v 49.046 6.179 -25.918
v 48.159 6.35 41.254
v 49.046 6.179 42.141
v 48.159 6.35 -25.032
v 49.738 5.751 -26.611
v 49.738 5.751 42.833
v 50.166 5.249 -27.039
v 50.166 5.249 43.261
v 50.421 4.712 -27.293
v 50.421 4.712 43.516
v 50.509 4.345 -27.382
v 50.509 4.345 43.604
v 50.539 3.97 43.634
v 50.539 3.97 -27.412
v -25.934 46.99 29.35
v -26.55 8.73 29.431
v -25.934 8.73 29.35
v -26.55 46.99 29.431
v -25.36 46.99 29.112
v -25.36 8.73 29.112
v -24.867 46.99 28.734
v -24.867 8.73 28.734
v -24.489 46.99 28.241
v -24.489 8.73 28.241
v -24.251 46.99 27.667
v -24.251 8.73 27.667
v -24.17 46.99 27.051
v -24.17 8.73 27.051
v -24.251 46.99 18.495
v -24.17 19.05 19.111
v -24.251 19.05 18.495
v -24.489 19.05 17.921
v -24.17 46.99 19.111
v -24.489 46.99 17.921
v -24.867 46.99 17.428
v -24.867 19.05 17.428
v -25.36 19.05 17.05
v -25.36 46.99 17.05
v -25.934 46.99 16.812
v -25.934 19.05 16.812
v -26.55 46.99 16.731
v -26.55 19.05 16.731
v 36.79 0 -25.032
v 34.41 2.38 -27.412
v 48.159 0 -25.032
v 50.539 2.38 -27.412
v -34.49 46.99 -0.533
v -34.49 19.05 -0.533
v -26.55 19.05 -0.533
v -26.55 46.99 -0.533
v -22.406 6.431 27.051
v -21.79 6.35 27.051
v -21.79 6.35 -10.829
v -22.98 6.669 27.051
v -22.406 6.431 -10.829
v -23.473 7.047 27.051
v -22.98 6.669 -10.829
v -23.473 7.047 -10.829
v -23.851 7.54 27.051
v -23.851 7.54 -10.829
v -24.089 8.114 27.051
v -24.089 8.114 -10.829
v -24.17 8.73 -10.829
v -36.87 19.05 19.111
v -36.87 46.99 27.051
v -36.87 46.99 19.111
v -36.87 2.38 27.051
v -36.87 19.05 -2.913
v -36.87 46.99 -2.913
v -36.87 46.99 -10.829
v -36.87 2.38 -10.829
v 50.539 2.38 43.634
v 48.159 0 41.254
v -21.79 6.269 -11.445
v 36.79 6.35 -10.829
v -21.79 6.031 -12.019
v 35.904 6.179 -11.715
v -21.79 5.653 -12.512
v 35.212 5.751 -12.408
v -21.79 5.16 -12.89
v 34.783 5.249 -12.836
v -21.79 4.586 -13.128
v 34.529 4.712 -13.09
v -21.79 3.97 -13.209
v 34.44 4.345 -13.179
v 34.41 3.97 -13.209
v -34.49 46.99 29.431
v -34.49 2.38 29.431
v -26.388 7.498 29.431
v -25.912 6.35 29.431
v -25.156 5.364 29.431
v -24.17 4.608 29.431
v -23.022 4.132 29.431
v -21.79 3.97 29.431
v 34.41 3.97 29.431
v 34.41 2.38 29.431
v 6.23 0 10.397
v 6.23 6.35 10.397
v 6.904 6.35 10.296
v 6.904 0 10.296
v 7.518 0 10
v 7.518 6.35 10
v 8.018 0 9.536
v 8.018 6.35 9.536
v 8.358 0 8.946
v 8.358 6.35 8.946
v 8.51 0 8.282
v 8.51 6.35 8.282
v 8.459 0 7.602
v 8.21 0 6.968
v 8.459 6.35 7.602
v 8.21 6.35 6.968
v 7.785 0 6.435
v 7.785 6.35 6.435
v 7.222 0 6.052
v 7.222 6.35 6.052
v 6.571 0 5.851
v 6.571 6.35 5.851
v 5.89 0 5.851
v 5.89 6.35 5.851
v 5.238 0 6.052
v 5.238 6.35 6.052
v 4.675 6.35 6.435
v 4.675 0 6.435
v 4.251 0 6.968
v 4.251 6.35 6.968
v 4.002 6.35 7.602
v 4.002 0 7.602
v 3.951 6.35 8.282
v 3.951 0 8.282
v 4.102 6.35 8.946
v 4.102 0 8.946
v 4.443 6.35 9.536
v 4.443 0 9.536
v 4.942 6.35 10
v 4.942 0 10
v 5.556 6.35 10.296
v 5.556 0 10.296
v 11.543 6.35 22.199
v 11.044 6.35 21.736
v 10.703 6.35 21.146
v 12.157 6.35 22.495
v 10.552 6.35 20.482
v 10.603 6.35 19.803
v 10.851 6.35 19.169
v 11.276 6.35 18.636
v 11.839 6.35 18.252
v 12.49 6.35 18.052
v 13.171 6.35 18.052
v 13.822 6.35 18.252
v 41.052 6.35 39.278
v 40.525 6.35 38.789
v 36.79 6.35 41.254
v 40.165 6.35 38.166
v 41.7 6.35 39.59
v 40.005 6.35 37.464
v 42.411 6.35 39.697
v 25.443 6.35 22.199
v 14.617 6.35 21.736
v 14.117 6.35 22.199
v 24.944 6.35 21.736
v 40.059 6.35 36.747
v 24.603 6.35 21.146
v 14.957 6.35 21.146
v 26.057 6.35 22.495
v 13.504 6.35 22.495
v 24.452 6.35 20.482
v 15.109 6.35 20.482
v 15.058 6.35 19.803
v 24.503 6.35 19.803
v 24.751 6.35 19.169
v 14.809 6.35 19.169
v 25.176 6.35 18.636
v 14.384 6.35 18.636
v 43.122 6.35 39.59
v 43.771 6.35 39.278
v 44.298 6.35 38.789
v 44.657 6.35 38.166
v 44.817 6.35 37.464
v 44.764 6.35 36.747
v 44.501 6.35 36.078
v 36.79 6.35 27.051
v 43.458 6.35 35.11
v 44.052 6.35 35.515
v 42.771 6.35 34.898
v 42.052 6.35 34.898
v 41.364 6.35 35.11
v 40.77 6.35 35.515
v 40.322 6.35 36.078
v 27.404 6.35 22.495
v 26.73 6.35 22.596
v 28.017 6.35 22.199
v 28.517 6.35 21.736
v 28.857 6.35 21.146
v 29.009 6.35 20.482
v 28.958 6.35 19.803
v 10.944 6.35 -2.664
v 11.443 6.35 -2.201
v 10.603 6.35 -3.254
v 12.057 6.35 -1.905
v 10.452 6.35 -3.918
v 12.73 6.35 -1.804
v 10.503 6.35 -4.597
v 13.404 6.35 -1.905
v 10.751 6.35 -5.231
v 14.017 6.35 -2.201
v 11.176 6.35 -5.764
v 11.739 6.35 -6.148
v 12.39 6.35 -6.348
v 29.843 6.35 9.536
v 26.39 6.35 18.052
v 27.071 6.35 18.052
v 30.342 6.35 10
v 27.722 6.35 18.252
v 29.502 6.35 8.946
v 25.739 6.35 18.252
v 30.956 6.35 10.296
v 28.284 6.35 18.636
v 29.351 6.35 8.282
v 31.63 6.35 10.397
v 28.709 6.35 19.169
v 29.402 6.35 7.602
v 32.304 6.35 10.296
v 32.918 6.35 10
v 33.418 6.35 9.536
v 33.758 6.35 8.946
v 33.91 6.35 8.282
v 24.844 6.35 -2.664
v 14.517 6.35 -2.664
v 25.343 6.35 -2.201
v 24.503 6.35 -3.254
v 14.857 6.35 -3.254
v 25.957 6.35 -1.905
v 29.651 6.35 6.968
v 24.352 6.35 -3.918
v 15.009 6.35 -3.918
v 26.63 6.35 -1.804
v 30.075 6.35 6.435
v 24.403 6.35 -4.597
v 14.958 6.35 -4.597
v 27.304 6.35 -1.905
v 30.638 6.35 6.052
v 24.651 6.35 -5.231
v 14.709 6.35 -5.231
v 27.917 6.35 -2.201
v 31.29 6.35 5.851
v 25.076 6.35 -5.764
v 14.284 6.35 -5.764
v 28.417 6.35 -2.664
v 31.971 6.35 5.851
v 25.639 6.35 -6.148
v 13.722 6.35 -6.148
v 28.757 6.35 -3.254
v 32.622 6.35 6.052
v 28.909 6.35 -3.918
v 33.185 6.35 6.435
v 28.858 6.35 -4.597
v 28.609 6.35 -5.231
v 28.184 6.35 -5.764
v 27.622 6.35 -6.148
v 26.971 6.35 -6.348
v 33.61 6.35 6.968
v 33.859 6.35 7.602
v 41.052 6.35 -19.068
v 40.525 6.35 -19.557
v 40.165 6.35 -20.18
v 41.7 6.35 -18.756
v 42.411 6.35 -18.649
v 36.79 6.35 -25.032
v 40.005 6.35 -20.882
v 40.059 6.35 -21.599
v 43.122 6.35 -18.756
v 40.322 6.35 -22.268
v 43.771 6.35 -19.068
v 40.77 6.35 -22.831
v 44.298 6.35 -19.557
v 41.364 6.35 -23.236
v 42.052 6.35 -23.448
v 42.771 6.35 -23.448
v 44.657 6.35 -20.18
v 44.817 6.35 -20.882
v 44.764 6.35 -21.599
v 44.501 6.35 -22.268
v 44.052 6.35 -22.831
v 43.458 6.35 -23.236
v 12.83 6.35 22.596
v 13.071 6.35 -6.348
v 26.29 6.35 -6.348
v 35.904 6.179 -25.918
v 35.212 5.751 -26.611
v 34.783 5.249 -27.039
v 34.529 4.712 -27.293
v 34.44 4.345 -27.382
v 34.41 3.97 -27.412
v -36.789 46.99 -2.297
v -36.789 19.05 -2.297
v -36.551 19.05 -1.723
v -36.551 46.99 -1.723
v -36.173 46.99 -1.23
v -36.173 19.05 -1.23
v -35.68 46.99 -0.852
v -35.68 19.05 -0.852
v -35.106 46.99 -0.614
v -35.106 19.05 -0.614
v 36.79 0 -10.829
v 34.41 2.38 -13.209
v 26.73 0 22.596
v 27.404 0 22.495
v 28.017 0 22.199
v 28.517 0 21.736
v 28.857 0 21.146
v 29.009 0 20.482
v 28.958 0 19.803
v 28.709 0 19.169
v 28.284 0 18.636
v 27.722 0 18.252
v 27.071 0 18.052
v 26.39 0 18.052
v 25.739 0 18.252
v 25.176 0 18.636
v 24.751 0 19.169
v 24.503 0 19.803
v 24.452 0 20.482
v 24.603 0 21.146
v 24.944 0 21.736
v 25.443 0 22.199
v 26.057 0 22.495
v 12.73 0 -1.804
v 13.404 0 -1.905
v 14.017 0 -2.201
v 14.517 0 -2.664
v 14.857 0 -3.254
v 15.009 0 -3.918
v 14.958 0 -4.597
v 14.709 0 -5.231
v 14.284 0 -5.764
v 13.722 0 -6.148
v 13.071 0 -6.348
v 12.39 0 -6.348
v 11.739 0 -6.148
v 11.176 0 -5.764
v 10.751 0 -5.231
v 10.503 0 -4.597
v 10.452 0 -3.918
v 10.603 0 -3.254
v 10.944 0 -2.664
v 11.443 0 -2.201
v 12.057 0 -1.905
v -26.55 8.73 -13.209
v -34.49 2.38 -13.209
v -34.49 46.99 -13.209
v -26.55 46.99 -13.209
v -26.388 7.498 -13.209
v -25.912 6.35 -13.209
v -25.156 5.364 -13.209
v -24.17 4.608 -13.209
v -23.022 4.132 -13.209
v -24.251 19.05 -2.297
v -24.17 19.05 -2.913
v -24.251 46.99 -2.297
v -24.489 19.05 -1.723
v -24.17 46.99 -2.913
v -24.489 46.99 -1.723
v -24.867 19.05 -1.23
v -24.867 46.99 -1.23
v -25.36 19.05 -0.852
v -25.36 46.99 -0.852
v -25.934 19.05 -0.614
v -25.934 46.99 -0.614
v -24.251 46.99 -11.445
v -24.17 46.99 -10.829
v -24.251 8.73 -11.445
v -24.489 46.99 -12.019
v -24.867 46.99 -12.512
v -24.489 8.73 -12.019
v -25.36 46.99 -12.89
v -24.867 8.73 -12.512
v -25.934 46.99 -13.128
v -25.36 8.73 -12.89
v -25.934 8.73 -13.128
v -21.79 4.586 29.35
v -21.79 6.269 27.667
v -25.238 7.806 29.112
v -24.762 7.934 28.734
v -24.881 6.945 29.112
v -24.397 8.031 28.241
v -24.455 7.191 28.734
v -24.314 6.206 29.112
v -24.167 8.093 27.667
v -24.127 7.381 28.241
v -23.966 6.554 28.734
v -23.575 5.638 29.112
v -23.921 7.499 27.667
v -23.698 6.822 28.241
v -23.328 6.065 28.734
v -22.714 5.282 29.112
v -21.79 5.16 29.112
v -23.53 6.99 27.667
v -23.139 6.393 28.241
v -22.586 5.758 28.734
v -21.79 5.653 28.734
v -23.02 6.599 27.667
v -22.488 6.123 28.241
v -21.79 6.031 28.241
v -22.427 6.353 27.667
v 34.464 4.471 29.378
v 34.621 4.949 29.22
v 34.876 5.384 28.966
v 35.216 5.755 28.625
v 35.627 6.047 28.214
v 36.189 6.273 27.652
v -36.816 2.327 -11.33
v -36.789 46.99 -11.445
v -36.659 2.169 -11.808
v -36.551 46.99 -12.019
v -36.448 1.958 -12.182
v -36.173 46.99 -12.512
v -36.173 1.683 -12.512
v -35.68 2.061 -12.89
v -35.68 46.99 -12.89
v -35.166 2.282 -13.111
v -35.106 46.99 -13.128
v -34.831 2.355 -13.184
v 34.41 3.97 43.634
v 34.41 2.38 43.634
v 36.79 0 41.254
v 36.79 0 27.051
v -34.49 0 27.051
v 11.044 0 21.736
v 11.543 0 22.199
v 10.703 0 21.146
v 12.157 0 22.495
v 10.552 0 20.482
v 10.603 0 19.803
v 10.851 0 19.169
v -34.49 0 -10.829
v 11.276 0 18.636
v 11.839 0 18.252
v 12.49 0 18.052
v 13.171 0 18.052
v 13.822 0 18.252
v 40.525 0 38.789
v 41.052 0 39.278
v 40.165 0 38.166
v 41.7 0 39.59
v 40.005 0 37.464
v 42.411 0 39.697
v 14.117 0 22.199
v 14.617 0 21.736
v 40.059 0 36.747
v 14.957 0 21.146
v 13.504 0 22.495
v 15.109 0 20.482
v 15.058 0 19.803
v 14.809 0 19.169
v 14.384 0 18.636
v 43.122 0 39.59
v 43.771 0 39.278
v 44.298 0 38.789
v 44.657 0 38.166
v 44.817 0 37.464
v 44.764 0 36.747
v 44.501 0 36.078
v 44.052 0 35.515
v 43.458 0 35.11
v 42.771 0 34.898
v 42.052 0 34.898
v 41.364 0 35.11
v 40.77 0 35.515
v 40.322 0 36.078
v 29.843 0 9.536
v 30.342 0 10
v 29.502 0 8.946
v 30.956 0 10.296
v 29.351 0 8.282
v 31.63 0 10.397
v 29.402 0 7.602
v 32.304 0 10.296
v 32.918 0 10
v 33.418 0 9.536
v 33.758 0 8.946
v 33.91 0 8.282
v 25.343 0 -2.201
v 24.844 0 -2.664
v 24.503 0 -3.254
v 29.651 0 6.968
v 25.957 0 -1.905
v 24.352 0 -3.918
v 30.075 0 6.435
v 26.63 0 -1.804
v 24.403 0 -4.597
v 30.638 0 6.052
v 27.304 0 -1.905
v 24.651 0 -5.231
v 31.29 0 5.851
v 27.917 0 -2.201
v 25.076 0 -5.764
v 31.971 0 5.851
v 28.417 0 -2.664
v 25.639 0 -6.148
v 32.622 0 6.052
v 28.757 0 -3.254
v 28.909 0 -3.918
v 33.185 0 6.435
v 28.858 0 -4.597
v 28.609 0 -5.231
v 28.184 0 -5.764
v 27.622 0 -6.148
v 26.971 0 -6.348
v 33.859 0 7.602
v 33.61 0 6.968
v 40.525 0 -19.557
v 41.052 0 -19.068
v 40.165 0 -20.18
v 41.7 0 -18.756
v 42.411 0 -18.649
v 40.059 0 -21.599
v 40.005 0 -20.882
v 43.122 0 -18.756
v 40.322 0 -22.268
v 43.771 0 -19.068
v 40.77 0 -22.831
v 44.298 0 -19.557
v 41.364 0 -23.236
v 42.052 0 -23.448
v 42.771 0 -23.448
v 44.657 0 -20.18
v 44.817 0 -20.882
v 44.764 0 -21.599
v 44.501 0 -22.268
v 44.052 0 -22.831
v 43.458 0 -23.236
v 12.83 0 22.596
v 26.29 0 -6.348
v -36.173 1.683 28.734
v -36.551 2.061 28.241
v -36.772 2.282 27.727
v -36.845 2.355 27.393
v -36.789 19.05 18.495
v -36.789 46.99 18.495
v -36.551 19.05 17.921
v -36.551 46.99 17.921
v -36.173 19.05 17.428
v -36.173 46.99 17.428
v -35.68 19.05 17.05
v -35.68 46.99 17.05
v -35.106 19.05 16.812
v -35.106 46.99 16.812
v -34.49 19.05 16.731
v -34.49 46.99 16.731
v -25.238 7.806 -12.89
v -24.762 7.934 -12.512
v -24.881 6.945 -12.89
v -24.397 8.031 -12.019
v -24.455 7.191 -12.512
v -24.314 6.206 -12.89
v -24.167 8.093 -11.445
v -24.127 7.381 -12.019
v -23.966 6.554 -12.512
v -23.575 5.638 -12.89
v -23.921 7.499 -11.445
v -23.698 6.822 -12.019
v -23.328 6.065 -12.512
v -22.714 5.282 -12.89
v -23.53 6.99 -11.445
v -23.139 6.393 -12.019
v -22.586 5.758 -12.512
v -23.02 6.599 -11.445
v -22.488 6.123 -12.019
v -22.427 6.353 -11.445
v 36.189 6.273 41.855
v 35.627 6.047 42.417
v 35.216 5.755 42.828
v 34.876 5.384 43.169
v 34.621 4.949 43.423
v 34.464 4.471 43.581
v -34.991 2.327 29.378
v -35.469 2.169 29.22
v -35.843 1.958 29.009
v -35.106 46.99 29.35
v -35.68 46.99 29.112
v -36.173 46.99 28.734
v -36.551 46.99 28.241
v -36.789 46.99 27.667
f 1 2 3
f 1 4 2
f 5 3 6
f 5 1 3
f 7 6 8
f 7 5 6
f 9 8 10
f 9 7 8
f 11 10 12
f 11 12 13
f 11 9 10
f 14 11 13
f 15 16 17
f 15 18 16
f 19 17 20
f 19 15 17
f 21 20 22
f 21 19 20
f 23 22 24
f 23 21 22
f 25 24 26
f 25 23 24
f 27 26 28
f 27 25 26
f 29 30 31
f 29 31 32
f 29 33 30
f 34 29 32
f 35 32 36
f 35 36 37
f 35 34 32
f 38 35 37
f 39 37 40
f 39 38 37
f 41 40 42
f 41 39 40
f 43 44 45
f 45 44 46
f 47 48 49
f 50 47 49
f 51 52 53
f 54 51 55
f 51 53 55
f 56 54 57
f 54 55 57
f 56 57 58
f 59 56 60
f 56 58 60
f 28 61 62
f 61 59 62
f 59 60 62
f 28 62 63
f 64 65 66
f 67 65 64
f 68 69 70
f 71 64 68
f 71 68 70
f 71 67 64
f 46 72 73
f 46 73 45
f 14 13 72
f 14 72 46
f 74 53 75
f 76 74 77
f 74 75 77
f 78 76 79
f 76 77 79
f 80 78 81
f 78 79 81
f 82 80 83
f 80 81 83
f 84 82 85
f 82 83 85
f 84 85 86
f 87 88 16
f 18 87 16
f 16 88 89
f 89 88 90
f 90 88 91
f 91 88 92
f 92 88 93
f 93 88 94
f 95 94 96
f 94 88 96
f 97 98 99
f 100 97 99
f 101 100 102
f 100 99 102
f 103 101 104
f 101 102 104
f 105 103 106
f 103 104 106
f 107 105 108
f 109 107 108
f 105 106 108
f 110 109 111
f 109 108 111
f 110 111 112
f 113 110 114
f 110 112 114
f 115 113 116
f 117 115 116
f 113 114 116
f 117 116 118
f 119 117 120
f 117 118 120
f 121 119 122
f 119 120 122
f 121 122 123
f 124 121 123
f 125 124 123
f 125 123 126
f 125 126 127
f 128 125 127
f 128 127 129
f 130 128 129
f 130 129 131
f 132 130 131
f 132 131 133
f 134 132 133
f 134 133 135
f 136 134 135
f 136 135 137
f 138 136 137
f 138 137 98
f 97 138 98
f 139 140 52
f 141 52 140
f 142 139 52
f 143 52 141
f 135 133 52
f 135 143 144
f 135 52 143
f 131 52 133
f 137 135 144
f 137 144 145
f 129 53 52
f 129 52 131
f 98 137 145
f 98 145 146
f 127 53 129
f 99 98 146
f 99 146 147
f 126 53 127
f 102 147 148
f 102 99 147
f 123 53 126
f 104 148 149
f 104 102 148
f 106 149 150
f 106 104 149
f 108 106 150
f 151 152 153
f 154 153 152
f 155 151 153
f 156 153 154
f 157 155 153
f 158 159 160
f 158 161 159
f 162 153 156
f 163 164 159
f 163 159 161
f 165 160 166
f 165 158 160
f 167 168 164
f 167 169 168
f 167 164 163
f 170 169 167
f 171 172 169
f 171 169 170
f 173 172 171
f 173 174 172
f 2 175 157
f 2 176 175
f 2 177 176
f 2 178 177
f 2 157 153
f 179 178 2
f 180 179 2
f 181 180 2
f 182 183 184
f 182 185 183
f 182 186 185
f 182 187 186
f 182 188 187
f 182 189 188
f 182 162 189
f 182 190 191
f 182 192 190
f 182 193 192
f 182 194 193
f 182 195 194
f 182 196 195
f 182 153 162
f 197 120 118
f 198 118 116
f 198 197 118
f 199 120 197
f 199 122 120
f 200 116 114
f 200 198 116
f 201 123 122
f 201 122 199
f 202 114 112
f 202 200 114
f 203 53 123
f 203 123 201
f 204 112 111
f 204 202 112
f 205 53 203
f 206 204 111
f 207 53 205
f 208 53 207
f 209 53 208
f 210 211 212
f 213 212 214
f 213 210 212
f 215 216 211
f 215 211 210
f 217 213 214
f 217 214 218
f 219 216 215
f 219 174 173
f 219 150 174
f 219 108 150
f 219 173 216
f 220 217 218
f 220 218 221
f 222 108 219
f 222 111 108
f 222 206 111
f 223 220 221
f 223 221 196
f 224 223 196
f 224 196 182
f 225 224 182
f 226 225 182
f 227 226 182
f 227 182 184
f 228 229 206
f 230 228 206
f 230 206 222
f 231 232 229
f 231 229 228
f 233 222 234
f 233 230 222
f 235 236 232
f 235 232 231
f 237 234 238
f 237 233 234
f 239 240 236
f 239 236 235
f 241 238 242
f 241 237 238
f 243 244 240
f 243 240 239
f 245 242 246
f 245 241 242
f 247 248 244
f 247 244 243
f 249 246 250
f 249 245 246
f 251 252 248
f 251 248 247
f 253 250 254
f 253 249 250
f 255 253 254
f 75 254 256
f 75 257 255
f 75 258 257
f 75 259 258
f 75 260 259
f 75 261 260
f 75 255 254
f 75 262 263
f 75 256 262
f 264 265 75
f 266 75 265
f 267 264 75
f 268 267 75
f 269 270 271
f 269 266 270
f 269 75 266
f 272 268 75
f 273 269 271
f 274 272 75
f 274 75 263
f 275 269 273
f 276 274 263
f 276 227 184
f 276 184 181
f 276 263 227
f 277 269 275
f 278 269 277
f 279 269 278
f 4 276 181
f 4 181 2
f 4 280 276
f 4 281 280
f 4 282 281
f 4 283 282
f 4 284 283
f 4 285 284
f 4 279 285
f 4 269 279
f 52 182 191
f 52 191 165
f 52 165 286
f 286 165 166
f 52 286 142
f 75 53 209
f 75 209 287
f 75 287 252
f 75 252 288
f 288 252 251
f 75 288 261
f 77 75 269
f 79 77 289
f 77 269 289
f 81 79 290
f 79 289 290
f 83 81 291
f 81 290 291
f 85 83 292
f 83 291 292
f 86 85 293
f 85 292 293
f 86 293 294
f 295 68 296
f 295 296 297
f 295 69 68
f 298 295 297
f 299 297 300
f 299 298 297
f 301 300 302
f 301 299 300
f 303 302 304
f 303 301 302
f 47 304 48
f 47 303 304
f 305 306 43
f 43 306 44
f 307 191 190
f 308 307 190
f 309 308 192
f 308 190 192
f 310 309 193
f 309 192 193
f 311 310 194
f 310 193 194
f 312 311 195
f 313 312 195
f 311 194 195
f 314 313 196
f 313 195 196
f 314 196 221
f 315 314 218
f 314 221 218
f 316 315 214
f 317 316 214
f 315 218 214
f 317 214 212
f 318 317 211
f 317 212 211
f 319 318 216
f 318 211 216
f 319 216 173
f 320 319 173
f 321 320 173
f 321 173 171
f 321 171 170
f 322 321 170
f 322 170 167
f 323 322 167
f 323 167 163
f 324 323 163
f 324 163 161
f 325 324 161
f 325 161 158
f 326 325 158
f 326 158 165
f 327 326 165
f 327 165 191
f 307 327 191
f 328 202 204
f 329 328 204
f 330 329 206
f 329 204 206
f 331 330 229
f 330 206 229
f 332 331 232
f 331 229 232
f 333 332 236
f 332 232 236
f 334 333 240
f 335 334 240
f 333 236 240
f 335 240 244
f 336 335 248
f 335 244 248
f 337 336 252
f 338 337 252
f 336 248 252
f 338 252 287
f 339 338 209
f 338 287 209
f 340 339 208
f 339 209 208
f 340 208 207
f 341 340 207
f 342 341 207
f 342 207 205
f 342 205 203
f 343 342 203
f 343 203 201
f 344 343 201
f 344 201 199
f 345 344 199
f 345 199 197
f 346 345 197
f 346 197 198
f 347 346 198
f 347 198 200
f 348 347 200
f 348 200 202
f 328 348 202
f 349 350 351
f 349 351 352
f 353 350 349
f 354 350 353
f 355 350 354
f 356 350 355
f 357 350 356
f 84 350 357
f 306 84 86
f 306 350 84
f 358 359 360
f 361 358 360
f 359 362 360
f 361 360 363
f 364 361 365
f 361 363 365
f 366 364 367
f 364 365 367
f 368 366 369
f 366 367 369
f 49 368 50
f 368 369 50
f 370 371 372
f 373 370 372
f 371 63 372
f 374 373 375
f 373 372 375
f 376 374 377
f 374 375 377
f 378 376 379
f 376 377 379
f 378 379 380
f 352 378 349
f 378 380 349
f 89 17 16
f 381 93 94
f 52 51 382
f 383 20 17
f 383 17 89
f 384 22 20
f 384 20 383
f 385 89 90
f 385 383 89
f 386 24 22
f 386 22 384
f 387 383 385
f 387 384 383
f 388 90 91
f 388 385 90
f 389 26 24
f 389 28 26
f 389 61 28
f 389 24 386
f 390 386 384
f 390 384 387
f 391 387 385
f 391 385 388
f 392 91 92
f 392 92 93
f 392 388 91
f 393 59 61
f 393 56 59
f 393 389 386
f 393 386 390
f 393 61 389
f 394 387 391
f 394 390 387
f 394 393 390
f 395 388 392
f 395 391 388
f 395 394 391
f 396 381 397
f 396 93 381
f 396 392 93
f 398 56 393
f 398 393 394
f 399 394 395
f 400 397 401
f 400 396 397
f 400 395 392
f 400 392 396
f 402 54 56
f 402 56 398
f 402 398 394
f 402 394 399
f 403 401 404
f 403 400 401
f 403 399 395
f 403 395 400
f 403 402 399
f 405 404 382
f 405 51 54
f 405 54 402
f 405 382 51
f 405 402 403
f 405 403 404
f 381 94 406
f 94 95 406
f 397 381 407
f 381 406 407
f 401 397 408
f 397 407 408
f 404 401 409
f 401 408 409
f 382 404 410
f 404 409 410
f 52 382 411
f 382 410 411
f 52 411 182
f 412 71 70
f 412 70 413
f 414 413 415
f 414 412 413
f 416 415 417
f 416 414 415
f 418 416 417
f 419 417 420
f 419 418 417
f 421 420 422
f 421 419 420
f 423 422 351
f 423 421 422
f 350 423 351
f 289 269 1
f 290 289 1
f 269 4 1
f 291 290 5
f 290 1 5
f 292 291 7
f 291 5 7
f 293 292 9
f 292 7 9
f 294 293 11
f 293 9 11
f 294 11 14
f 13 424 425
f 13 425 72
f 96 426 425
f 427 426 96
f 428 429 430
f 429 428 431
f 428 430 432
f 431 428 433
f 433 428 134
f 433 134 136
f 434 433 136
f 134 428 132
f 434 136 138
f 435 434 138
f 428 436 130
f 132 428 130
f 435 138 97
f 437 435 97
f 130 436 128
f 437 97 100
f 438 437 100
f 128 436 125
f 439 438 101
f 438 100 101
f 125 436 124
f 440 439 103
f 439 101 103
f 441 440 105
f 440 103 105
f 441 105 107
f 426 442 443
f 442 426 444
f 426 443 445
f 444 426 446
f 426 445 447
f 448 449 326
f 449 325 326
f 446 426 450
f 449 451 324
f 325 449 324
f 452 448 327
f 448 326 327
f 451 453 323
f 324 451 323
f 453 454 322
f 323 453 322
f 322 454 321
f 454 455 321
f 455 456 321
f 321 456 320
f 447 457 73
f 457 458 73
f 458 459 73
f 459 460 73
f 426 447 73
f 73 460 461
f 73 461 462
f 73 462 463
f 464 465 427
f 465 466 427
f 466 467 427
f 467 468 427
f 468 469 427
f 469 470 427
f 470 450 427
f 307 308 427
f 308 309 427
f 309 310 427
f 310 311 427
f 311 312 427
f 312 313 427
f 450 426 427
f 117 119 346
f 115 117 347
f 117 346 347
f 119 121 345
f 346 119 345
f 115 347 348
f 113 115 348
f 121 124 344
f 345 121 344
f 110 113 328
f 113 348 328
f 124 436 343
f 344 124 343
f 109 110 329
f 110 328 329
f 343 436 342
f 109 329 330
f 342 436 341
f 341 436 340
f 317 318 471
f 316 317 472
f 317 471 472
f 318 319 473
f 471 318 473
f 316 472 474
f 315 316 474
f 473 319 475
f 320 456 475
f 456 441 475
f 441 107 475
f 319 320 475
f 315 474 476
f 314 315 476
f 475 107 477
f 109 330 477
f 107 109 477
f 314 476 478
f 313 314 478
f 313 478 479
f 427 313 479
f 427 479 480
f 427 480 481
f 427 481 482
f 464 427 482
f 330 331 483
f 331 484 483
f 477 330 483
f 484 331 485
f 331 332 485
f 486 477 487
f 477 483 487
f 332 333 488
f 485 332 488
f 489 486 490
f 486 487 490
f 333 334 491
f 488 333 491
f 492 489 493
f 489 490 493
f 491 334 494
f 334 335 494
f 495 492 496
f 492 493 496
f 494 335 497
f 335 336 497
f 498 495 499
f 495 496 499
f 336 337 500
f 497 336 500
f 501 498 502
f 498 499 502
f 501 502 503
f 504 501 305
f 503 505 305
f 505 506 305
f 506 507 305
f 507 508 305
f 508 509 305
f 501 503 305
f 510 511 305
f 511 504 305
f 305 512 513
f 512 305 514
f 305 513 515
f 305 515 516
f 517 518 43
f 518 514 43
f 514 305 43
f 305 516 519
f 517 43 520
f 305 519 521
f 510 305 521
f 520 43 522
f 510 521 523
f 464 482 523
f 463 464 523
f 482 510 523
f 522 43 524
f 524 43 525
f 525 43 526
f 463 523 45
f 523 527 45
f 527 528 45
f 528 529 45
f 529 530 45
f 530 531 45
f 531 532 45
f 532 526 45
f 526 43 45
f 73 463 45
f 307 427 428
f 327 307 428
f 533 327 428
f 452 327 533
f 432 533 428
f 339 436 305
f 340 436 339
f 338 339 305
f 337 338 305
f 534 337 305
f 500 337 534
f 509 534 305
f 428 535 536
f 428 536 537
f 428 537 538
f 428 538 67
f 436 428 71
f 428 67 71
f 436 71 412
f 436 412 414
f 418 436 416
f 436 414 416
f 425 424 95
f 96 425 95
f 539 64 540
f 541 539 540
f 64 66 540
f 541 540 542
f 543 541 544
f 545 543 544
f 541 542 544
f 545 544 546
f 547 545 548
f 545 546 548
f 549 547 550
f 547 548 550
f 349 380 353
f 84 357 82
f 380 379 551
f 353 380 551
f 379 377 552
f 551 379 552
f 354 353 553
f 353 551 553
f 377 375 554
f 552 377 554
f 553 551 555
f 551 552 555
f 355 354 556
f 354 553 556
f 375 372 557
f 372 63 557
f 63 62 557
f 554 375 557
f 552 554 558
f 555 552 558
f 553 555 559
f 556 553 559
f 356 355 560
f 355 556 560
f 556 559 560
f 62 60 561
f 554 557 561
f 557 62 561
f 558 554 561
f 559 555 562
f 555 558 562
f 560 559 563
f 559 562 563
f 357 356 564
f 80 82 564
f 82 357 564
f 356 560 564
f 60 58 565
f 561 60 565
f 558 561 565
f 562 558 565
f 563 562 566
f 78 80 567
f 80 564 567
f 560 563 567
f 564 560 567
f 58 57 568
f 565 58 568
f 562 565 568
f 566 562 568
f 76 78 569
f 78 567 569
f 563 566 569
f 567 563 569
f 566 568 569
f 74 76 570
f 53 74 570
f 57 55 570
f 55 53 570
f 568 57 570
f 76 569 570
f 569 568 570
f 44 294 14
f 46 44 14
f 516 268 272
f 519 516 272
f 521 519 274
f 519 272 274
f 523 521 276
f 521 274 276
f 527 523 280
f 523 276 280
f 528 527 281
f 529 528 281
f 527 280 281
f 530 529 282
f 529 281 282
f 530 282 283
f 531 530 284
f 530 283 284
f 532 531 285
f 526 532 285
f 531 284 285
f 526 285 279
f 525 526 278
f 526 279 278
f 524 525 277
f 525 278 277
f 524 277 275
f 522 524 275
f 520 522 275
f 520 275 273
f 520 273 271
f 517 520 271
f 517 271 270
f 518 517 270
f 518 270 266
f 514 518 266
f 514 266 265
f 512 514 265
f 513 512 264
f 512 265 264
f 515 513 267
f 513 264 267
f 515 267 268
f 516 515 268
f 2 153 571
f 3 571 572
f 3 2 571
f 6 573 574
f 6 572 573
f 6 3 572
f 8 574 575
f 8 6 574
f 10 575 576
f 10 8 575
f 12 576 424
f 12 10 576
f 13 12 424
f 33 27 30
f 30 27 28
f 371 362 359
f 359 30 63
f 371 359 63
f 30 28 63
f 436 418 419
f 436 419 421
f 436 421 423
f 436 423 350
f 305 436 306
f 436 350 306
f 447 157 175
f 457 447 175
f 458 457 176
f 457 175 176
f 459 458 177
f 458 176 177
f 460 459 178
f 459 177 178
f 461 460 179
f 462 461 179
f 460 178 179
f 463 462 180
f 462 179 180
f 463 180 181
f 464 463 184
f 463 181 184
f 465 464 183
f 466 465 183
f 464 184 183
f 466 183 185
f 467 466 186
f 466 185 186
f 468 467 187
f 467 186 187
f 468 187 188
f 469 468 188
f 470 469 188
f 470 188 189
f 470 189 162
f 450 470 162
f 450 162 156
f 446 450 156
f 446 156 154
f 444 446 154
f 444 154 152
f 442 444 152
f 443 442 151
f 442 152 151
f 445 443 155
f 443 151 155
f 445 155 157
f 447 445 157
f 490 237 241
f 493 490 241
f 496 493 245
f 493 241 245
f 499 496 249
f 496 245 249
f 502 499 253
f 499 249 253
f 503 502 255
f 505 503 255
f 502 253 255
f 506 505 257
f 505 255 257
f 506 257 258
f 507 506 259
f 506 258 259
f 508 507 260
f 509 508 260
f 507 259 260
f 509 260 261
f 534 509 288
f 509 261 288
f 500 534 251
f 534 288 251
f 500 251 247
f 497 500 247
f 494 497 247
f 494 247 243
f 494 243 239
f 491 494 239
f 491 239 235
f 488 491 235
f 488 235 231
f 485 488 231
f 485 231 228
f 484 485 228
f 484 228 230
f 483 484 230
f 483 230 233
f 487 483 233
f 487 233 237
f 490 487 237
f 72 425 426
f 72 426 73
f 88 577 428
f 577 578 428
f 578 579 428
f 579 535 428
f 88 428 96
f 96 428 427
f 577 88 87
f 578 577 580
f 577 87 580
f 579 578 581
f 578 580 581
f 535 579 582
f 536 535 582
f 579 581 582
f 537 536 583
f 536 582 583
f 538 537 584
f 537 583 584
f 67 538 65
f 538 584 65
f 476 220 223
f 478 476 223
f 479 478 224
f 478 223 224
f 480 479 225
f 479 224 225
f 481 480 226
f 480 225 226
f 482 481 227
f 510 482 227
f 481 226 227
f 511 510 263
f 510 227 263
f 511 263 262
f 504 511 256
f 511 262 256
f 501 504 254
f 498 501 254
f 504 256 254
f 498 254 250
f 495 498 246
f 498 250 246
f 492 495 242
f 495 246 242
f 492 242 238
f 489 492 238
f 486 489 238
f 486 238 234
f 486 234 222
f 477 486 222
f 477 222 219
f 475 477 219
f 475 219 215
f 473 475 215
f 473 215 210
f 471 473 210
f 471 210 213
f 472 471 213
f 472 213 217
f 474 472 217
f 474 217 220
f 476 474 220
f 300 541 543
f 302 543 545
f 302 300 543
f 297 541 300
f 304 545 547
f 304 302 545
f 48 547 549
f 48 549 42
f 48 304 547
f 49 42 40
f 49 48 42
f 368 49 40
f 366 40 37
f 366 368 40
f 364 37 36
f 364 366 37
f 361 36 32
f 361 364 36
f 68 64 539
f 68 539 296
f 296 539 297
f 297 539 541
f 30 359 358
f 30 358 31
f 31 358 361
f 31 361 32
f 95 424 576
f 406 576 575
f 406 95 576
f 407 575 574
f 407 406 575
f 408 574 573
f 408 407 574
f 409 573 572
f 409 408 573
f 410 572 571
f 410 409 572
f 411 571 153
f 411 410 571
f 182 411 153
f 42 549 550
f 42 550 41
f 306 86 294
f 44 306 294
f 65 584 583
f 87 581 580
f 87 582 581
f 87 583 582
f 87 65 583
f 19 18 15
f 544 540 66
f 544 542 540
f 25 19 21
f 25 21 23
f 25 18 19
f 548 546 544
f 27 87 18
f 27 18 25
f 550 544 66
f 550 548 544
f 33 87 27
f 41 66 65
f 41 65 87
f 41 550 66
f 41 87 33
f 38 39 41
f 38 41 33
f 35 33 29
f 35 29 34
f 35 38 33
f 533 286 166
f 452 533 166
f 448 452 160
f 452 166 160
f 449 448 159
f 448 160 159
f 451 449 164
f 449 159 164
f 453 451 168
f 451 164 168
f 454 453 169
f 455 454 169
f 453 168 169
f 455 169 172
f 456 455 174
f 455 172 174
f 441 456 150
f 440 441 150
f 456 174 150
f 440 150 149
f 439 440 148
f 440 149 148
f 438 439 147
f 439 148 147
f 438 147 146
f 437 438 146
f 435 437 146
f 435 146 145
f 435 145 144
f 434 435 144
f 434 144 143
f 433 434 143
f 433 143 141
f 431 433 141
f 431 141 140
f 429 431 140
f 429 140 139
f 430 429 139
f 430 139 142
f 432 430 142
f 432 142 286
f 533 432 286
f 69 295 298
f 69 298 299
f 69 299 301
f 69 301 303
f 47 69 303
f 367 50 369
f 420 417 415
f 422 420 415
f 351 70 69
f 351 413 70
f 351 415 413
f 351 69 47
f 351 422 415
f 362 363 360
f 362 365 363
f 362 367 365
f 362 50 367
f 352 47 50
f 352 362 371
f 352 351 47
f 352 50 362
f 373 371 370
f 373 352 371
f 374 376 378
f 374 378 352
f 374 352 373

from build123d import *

# Parameters (mm, degrees)
SKETCH1_W           = 71.28
SKETCH1_H           = 42.64
BOSS_EXTRUDE1_DEPTH = 6.35
SKETCH3_W           = 12.7
SKETCH3_H           = 42.64
BOSS_EXTRUDE3_DEPTH = 12.7
SKETCH4_W           = 12.7
SKETCH4_H           = 12.7
BOSS_EXTRUDE4_DEPTH = 27.94
SKETCH6_W           = 12.7
SKETCH6_H           = 12.676175504
BOSS_EXTRUDE5_DEPTH = 27.94
SKETCH7_R           = 2.286
SKETCH7_R_2         = 2.285
CUT_EXTRUDE1_DEPTH  = 63.267019151
SKETCH10_W          = 16.129
SKETCH10_H          = 71.046005576
BOSS_EXTRUDE6_DEPTH = 6.35
SKETCH11_R          = 2.413
CUT_EXTRUDE2_DEPTH  = 6.35
CHAMFER1_SIZE       = 2.38
FILLET1_R           = 2.38


with BuildPart() as part:
    # Sketch1 → Boss-Extrude1 (new body)
    with BuildSketch(Plane(origin=(0, 0, 0), x_dir=(1, 0, 0), z_dir=(0, 1, 0))):
        with Locations((-1.22975773, -8.11115762)):
            Rectangle(SKETCH1_W, SKETCH1_H)
    extrude(amount=BOSS_EXTRUDE1_DEPTH)

    # Sketch3 → Boss-Extrude3 (add)
    with BuildSketch(Plane(origin=(0, 6.35, 0), x_dir=(1, 0, 0), z_dir=(0, 1, 0))):
        with Locations((-30.51975773, -8.11115762)):
            Rectangle(SKETCH3_W, SKETCH3_H)
    extrude(amount=BOSS_EXTRUDE3_DEPTH)

    # Sketch4 → Boss-Extrude4 (add)
    with BuildSketch(Plane(origin=(0, 19.05, 0), x_dir=(1, 0, 0), z_dir=(0, 1, 0))):
        with Locations((-30.51975773, -23.08115762)):
            Rectangle(SKETCH4_W, SKETCH4_H)
    extrude(amount=BOSS_EXTRUDE4_DEPTH)

    # Sketch6 → Boss-Extrude5 (add)
    with BuildSketch(Plane(origin=(0, 19.05, 0), x_dir=(1, 0, 0), z_dir=(0, 1, 0))):
        with Locations((-30.51975773, 6.870754628)):
            Rectangle(SKETCH6_W, SKETCH6_H)
    extrude(amount=BOSS_EXTRUDE5_DEPTH)

    # Sketch7 → Cut-Extrude1 (cut, through all)
    with BuildSketch(Plane(origin=(0, 6.35, 0), x_dir=(1, 0, 0), z_dir=(0, 1, 0))):
        with Locations(Location((6.23024227, -8.11115762, 0), (0, 0, 270))):
            Circle(SKETCH7_R)
        with Locations(Location((31.63024227, -8.11115762, 0), (0, 0, 270))):
            Circle(SKETCH7_R)
        with Locations(Location((12.73024227, 4.08884238, 0), (0, 0, 270))):
            Circle(SKETCH7_R_2)
        with Locations(Location((12.83024227, -20.31115762, 0), (0, 0, 270))):
            Circle(SKETCH7_R_2)
        with Locations(Location((26.63024227, 4.08884238, 0), (0, 0, 270))):
            Circle(SKETCH7_R_2)
        with Locations(Location((26.73024227, -20.31115762, 0), (0, 0, 270))):
            Circle(SKETCH7_R_2)
    extrude(amount=-CUT_EXTRUDE1_DEPTH, mode=Mode.SUBTRACT)

    # Sketch10 → Boss-Extrude6 (add)
    with BuildSketch(Plane(origin=(0, 6.35, 0), x_dir=(1, 0, 0), z_dir=(0, 1, 0))):
        with Locations((42.47474227, -8.11115762)):
            Rectangle(SKETCH10_W, SKETCH10_H)
    extrude(amount=-BOSS_EXTRUDE6_DEPTH)

    # Sketch11 → Cut-Extrude2 (cut)
    with BuildSketch(Plane(origin=(0, 6.35, 0), x_dir=(1, 0, 0), z_dir=(0, 1, 0))):
        with Locations(Location((42.41124227, 21.061845168, 0), (0, 0, 270))):
            Circle(SKETCH11_R)
        with Locations(Location((42.41124227, -37.284160408, 0), (0, 0, 270))):
            Circle(SKETCH11_R)
    extrude(amount=-CUT_EXTRUDE2_DEPTH, mode=Mode.SUBTRACT)

    # Chamfer1
    chamfer1_edges = [part.edges().sort_by_distance(p)[0] for p in [
        (-1.22975773, 0, 29.43115762),
        (-36.86975773, 0, 8.11115762),
        (-1.22975773, 0, -13.20884238),
        (34.41024227, 0, -20.310343774),
        (34.41024227, 0, 36.532659014),
        (42.47474227, 0, -27.411845168),
        (50.53924227, 0, 8.11115762),
        (42.47474227, 0, 43.634160408),
    ]]
    chamfer(chamfer1_edges, length=CHAMFER1_SIZE)

    # Fillet1
    fillet1_edges = [part.edges().sort_by_distance(p)[0] for p in [
        (5.12024227, 6.35, 29.43115762),
        (-24.16975773, 6.35, 8.11115762),
        (-24.16975773, 26.67, 29.43115762),
        (-24.16975773, 26.67, -13.20884238),
        (-24.16975773, 33.02, 16.73115762),
        (-36.86975773, 33.02, 16.73115762),
        (-36.86975773, 33.02, -0.532666876),
        (-24.16975773, 33.02, -0.532666876),
        (5.12024227, 6.35, -13.20884238),
        (-36.86975773, 24.685, 29.43115762),
        (-36.86975773, 24.685, -13.20884238),
        (34.41024227, 6.35, -20.310343774),
        (34.41024227, 6.35, 36.532659014),
        (42.47474227, 6.35, 43.634160408),
        (50.53924227, 6.35, 8.11115762),
        (42.47474227, 6.35, -27.411845168),
    ]]
    fillet(fillet1_edges, radius=FILLET1_R)


solid = part.part
